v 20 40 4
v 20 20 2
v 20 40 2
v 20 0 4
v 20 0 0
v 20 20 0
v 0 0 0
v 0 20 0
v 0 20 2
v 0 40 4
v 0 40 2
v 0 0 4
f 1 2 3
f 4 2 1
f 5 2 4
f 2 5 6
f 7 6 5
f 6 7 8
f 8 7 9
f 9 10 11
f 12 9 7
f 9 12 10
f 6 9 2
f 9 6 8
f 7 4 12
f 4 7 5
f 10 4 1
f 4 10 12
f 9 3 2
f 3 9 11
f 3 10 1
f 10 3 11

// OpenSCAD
cube(size=[20,20,3.1]);
translate([0, 0, 2])
cube(size=[20,40,2]);
